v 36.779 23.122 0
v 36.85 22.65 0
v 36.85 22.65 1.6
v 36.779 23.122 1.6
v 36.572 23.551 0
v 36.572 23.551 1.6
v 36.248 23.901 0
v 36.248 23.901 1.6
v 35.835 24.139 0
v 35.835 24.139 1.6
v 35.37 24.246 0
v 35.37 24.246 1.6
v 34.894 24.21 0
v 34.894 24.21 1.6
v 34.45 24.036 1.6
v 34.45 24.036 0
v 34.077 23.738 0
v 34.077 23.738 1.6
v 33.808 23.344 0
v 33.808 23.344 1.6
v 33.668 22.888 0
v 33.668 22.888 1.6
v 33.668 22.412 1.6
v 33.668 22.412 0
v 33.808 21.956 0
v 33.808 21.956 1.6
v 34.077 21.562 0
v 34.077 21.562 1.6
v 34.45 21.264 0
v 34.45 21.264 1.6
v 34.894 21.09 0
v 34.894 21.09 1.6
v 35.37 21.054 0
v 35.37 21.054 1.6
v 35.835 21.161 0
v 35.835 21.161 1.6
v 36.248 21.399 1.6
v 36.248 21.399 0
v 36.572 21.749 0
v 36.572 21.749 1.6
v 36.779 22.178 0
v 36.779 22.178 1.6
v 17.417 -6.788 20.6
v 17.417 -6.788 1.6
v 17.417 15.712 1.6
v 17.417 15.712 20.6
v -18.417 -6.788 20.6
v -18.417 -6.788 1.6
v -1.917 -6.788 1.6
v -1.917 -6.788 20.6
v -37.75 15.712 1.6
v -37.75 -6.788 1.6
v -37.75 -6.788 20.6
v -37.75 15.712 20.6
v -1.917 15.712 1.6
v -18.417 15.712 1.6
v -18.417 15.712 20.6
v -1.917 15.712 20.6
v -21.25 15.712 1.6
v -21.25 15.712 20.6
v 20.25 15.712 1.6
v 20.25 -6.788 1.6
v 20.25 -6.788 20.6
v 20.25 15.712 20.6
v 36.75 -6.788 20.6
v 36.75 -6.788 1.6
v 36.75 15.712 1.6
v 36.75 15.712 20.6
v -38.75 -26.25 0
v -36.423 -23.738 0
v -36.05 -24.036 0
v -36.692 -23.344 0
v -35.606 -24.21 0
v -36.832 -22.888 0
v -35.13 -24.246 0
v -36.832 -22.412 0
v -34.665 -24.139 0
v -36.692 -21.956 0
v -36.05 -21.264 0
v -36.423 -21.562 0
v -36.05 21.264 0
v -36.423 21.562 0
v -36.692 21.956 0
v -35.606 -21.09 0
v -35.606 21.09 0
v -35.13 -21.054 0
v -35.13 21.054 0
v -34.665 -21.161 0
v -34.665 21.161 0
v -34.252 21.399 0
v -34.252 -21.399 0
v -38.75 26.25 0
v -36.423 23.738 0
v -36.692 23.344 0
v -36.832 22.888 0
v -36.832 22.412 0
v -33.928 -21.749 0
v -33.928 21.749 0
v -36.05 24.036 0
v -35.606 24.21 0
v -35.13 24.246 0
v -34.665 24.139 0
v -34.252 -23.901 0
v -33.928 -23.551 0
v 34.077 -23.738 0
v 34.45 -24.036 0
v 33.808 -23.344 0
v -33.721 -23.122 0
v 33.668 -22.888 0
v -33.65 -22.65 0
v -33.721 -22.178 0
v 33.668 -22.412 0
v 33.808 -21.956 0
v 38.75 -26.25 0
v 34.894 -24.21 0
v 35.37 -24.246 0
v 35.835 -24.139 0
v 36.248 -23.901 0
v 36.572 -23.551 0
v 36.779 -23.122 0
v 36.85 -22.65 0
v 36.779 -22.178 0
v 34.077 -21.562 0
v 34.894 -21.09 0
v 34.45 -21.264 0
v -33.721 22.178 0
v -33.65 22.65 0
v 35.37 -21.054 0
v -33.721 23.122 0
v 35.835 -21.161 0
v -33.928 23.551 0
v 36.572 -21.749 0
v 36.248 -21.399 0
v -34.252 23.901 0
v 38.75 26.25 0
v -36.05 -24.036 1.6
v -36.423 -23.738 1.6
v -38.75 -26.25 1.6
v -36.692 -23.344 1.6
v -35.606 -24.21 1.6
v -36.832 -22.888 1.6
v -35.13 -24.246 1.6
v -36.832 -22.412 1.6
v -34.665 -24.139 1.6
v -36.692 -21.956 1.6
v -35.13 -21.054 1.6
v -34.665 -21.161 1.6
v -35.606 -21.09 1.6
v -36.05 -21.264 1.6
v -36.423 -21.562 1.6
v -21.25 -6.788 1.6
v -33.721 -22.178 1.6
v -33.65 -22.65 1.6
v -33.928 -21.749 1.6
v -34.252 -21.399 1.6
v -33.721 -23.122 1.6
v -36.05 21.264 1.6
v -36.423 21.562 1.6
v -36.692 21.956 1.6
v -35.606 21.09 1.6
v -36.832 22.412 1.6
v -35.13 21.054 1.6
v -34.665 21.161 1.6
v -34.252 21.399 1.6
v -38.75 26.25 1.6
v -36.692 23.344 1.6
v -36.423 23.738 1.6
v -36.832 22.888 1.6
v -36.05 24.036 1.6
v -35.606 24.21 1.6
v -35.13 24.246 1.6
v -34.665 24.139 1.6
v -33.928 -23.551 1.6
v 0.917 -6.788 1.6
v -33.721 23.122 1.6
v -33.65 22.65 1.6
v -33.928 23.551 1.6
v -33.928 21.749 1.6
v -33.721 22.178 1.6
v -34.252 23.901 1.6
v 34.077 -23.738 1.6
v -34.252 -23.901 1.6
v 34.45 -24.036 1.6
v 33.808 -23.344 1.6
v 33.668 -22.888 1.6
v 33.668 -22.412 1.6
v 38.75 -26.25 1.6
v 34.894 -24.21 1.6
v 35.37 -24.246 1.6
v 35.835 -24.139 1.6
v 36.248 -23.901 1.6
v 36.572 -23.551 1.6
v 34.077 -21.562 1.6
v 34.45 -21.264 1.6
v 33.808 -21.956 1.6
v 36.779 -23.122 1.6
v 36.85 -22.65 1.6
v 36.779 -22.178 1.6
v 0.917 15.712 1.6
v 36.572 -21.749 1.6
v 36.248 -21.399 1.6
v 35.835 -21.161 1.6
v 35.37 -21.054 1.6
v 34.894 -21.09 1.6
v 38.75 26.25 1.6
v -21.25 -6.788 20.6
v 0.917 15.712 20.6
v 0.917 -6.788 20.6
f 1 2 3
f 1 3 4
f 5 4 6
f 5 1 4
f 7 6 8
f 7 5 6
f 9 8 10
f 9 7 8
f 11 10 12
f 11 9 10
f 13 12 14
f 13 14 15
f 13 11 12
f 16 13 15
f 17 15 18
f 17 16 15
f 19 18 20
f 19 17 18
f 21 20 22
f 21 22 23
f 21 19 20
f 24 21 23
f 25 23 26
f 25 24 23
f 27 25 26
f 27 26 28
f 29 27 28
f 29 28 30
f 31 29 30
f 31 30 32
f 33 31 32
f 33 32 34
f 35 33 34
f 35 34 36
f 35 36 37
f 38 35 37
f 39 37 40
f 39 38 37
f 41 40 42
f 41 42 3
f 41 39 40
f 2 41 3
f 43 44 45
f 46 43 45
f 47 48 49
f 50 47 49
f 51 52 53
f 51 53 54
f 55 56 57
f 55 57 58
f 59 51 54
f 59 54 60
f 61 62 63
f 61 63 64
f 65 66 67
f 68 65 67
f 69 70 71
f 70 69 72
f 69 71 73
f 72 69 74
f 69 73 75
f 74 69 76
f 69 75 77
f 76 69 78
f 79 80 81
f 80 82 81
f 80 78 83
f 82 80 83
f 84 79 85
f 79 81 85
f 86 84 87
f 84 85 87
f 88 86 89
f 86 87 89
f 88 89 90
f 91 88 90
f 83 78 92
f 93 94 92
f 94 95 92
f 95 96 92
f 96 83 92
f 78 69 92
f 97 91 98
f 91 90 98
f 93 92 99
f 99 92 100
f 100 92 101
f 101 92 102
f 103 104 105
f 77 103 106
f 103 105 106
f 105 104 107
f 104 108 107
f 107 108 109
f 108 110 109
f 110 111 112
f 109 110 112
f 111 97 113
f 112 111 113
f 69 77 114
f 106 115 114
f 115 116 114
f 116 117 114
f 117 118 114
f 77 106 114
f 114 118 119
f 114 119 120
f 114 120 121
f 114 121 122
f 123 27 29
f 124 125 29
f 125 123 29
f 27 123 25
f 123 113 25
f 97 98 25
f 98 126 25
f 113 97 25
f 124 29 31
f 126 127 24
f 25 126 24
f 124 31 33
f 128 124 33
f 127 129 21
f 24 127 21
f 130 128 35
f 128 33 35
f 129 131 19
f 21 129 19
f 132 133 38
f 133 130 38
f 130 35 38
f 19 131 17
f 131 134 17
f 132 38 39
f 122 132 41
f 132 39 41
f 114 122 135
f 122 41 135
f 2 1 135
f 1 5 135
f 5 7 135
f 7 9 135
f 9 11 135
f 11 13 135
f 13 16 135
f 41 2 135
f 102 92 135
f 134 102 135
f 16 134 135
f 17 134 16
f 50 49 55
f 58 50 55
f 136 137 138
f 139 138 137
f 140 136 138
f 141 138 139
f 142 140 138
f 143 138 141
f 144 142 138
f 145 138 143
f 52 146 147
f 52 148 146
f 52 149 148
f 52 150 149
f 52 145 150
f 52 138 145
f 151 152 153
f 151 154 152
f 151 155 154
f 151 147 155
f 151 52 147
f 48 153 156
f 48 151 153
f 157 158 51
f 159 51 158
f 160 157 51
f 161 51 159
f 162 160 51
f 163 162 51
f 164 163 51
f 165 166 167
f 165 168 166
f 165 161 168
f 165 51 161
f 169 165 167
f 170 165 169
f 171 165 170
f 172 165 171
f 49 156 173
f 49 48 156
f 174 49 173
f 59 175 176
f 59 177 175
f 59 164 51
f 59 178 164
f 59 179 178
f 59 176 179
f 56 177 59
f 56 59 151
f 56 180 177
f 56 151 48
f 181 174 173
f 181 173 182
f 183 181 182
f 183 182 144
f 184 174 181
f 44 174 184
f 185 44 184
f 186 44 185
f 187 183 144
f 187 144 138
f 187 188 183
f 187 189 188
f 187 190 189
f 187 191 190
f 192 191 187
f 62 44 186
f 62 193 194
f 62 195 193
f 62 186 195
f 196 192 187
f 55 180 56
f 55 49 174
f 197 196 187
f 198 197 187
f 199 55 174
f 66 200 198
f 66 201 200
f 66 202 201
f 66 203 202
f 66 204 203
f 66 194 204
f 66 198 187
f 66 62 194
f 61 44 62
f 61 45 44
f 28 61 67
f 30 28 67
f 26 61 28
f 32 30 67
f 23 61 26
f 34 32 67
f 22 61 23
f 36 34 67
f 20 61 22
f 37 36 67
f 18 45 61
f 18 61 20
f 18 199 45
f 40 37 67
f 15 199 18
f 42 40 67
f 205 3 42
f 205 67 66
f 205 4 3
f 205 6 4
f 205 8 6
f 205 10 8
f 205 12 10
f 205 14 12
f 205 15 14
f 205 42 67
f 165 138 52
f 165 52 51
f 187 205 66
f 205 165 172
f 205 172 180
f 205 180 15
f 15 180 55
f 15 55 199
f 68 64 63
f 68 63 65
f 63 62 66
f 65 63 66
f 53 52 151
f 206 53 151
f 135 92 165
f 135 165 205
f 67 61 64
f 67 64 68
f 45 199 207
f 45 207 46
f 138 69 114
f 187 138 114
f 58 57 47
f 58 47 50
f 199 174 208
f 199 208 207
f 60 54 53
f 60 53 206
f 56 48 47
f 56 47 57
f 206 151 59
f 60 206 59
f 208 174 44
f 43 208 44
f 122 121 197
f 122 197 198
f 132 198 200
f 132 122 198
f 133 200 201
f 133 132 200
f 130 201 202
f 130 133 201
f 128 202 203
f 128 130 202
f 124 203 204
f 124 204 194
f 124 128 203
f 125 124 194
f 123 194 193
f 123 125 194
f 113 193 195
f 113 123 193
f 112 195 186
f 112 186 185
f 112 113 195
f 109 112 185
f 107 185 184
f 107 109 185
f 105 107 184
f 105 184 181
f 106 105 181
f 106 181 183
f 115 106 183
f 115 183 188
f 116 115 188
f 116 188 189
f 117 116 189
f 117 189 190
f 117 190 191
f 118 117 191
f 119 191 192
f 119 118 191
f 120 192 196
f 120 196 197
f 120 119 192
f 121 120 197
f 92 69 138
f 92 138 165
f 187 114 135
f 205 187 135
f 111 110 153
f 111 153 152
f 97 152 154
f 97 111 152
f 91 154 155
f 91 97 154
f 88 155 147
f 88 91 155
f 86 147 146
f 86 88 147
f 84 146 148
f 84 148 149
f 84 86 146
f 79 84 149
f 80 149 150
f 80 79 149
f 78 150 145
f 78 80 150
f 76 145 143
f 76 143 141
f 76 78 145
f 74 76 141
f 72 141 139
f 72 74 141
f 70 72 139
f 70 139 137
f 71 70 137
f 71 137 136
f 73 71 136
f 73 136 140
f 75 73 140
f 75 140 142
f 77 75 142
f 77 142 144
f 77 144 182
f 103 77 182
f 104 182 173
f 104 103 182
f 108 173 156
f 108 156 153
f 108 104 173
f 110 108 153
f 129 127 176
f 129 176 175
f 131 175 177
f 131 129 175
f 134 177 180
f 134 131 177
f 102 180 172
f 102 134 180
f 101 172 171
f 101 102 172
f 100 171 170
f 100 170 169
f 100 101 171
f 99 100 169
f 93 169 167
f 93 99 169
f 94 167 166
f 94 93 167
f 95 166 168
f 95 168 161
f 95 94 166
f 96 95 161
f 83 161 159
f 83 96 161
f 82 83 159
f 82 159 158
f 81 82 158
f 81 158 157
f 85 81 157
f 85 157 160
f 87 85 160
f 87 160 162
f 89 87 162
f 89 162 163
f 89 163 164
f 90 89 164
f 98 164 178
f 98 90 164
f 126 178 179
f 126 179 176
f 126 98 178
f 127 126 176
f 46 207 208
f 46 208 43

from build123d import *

# Parameters (mm, degrees)
SKETCH_W            = 77.5
SKETCH_H            = 52.5
SKETCH_R            = 1.6
PAD_DEPTH           = 1.6
SKETCH004_W         = 16.5
SKETCH004_H         = 22.5
PAD004_DEPTH        = 19
LINEARPATTERN_COUNT = 4
LINEARPATTERN_PITCH = 19.333333


with BuildPart() as part:
    # Sketch → Pad (new body)
    with BuildSketch(Plane.XY):
        Rectangle(SKETCH_W, SKETCH_H)
        with Locations((-35.25, 22.65)):
            Circle(SKETCH_R, mode=Mode.SUBTRACT)
        with Locations((-35.25, -22.65)):
            Circle(SKETCH_R, mode=Mode.SUBTRACT)
        with Locations((35.25, 22.65)):
            Circle(SKETCH_R, mode=Mode.SUBTRACT)
        with Locations((35.25, -22.65)):
            Circle(SKETCH_R, mode=Mode.SUBTRACT)
    extrude(amount=PAD_DEPTH)

    # Sketch004 (on Face10 of Pad) → Pad004 (join)
    with BuildSketch(Plane.XY.offset(1.6)):
        with Locations((-29.499962, 4.46239)):
            Rectangle(SKETCH004_W, SKETCH004_H)
    pad004 = extrude(amount=PAD004_DEPTH)

    # LinearPattern: Pad004 ×4
    with Locations(*[(i * LINEARPATTERN_PITCH, 0, 0) for i in range(1, LINEARPATTERN_COUNT)]):
        add(pad004)


solid = part.part
